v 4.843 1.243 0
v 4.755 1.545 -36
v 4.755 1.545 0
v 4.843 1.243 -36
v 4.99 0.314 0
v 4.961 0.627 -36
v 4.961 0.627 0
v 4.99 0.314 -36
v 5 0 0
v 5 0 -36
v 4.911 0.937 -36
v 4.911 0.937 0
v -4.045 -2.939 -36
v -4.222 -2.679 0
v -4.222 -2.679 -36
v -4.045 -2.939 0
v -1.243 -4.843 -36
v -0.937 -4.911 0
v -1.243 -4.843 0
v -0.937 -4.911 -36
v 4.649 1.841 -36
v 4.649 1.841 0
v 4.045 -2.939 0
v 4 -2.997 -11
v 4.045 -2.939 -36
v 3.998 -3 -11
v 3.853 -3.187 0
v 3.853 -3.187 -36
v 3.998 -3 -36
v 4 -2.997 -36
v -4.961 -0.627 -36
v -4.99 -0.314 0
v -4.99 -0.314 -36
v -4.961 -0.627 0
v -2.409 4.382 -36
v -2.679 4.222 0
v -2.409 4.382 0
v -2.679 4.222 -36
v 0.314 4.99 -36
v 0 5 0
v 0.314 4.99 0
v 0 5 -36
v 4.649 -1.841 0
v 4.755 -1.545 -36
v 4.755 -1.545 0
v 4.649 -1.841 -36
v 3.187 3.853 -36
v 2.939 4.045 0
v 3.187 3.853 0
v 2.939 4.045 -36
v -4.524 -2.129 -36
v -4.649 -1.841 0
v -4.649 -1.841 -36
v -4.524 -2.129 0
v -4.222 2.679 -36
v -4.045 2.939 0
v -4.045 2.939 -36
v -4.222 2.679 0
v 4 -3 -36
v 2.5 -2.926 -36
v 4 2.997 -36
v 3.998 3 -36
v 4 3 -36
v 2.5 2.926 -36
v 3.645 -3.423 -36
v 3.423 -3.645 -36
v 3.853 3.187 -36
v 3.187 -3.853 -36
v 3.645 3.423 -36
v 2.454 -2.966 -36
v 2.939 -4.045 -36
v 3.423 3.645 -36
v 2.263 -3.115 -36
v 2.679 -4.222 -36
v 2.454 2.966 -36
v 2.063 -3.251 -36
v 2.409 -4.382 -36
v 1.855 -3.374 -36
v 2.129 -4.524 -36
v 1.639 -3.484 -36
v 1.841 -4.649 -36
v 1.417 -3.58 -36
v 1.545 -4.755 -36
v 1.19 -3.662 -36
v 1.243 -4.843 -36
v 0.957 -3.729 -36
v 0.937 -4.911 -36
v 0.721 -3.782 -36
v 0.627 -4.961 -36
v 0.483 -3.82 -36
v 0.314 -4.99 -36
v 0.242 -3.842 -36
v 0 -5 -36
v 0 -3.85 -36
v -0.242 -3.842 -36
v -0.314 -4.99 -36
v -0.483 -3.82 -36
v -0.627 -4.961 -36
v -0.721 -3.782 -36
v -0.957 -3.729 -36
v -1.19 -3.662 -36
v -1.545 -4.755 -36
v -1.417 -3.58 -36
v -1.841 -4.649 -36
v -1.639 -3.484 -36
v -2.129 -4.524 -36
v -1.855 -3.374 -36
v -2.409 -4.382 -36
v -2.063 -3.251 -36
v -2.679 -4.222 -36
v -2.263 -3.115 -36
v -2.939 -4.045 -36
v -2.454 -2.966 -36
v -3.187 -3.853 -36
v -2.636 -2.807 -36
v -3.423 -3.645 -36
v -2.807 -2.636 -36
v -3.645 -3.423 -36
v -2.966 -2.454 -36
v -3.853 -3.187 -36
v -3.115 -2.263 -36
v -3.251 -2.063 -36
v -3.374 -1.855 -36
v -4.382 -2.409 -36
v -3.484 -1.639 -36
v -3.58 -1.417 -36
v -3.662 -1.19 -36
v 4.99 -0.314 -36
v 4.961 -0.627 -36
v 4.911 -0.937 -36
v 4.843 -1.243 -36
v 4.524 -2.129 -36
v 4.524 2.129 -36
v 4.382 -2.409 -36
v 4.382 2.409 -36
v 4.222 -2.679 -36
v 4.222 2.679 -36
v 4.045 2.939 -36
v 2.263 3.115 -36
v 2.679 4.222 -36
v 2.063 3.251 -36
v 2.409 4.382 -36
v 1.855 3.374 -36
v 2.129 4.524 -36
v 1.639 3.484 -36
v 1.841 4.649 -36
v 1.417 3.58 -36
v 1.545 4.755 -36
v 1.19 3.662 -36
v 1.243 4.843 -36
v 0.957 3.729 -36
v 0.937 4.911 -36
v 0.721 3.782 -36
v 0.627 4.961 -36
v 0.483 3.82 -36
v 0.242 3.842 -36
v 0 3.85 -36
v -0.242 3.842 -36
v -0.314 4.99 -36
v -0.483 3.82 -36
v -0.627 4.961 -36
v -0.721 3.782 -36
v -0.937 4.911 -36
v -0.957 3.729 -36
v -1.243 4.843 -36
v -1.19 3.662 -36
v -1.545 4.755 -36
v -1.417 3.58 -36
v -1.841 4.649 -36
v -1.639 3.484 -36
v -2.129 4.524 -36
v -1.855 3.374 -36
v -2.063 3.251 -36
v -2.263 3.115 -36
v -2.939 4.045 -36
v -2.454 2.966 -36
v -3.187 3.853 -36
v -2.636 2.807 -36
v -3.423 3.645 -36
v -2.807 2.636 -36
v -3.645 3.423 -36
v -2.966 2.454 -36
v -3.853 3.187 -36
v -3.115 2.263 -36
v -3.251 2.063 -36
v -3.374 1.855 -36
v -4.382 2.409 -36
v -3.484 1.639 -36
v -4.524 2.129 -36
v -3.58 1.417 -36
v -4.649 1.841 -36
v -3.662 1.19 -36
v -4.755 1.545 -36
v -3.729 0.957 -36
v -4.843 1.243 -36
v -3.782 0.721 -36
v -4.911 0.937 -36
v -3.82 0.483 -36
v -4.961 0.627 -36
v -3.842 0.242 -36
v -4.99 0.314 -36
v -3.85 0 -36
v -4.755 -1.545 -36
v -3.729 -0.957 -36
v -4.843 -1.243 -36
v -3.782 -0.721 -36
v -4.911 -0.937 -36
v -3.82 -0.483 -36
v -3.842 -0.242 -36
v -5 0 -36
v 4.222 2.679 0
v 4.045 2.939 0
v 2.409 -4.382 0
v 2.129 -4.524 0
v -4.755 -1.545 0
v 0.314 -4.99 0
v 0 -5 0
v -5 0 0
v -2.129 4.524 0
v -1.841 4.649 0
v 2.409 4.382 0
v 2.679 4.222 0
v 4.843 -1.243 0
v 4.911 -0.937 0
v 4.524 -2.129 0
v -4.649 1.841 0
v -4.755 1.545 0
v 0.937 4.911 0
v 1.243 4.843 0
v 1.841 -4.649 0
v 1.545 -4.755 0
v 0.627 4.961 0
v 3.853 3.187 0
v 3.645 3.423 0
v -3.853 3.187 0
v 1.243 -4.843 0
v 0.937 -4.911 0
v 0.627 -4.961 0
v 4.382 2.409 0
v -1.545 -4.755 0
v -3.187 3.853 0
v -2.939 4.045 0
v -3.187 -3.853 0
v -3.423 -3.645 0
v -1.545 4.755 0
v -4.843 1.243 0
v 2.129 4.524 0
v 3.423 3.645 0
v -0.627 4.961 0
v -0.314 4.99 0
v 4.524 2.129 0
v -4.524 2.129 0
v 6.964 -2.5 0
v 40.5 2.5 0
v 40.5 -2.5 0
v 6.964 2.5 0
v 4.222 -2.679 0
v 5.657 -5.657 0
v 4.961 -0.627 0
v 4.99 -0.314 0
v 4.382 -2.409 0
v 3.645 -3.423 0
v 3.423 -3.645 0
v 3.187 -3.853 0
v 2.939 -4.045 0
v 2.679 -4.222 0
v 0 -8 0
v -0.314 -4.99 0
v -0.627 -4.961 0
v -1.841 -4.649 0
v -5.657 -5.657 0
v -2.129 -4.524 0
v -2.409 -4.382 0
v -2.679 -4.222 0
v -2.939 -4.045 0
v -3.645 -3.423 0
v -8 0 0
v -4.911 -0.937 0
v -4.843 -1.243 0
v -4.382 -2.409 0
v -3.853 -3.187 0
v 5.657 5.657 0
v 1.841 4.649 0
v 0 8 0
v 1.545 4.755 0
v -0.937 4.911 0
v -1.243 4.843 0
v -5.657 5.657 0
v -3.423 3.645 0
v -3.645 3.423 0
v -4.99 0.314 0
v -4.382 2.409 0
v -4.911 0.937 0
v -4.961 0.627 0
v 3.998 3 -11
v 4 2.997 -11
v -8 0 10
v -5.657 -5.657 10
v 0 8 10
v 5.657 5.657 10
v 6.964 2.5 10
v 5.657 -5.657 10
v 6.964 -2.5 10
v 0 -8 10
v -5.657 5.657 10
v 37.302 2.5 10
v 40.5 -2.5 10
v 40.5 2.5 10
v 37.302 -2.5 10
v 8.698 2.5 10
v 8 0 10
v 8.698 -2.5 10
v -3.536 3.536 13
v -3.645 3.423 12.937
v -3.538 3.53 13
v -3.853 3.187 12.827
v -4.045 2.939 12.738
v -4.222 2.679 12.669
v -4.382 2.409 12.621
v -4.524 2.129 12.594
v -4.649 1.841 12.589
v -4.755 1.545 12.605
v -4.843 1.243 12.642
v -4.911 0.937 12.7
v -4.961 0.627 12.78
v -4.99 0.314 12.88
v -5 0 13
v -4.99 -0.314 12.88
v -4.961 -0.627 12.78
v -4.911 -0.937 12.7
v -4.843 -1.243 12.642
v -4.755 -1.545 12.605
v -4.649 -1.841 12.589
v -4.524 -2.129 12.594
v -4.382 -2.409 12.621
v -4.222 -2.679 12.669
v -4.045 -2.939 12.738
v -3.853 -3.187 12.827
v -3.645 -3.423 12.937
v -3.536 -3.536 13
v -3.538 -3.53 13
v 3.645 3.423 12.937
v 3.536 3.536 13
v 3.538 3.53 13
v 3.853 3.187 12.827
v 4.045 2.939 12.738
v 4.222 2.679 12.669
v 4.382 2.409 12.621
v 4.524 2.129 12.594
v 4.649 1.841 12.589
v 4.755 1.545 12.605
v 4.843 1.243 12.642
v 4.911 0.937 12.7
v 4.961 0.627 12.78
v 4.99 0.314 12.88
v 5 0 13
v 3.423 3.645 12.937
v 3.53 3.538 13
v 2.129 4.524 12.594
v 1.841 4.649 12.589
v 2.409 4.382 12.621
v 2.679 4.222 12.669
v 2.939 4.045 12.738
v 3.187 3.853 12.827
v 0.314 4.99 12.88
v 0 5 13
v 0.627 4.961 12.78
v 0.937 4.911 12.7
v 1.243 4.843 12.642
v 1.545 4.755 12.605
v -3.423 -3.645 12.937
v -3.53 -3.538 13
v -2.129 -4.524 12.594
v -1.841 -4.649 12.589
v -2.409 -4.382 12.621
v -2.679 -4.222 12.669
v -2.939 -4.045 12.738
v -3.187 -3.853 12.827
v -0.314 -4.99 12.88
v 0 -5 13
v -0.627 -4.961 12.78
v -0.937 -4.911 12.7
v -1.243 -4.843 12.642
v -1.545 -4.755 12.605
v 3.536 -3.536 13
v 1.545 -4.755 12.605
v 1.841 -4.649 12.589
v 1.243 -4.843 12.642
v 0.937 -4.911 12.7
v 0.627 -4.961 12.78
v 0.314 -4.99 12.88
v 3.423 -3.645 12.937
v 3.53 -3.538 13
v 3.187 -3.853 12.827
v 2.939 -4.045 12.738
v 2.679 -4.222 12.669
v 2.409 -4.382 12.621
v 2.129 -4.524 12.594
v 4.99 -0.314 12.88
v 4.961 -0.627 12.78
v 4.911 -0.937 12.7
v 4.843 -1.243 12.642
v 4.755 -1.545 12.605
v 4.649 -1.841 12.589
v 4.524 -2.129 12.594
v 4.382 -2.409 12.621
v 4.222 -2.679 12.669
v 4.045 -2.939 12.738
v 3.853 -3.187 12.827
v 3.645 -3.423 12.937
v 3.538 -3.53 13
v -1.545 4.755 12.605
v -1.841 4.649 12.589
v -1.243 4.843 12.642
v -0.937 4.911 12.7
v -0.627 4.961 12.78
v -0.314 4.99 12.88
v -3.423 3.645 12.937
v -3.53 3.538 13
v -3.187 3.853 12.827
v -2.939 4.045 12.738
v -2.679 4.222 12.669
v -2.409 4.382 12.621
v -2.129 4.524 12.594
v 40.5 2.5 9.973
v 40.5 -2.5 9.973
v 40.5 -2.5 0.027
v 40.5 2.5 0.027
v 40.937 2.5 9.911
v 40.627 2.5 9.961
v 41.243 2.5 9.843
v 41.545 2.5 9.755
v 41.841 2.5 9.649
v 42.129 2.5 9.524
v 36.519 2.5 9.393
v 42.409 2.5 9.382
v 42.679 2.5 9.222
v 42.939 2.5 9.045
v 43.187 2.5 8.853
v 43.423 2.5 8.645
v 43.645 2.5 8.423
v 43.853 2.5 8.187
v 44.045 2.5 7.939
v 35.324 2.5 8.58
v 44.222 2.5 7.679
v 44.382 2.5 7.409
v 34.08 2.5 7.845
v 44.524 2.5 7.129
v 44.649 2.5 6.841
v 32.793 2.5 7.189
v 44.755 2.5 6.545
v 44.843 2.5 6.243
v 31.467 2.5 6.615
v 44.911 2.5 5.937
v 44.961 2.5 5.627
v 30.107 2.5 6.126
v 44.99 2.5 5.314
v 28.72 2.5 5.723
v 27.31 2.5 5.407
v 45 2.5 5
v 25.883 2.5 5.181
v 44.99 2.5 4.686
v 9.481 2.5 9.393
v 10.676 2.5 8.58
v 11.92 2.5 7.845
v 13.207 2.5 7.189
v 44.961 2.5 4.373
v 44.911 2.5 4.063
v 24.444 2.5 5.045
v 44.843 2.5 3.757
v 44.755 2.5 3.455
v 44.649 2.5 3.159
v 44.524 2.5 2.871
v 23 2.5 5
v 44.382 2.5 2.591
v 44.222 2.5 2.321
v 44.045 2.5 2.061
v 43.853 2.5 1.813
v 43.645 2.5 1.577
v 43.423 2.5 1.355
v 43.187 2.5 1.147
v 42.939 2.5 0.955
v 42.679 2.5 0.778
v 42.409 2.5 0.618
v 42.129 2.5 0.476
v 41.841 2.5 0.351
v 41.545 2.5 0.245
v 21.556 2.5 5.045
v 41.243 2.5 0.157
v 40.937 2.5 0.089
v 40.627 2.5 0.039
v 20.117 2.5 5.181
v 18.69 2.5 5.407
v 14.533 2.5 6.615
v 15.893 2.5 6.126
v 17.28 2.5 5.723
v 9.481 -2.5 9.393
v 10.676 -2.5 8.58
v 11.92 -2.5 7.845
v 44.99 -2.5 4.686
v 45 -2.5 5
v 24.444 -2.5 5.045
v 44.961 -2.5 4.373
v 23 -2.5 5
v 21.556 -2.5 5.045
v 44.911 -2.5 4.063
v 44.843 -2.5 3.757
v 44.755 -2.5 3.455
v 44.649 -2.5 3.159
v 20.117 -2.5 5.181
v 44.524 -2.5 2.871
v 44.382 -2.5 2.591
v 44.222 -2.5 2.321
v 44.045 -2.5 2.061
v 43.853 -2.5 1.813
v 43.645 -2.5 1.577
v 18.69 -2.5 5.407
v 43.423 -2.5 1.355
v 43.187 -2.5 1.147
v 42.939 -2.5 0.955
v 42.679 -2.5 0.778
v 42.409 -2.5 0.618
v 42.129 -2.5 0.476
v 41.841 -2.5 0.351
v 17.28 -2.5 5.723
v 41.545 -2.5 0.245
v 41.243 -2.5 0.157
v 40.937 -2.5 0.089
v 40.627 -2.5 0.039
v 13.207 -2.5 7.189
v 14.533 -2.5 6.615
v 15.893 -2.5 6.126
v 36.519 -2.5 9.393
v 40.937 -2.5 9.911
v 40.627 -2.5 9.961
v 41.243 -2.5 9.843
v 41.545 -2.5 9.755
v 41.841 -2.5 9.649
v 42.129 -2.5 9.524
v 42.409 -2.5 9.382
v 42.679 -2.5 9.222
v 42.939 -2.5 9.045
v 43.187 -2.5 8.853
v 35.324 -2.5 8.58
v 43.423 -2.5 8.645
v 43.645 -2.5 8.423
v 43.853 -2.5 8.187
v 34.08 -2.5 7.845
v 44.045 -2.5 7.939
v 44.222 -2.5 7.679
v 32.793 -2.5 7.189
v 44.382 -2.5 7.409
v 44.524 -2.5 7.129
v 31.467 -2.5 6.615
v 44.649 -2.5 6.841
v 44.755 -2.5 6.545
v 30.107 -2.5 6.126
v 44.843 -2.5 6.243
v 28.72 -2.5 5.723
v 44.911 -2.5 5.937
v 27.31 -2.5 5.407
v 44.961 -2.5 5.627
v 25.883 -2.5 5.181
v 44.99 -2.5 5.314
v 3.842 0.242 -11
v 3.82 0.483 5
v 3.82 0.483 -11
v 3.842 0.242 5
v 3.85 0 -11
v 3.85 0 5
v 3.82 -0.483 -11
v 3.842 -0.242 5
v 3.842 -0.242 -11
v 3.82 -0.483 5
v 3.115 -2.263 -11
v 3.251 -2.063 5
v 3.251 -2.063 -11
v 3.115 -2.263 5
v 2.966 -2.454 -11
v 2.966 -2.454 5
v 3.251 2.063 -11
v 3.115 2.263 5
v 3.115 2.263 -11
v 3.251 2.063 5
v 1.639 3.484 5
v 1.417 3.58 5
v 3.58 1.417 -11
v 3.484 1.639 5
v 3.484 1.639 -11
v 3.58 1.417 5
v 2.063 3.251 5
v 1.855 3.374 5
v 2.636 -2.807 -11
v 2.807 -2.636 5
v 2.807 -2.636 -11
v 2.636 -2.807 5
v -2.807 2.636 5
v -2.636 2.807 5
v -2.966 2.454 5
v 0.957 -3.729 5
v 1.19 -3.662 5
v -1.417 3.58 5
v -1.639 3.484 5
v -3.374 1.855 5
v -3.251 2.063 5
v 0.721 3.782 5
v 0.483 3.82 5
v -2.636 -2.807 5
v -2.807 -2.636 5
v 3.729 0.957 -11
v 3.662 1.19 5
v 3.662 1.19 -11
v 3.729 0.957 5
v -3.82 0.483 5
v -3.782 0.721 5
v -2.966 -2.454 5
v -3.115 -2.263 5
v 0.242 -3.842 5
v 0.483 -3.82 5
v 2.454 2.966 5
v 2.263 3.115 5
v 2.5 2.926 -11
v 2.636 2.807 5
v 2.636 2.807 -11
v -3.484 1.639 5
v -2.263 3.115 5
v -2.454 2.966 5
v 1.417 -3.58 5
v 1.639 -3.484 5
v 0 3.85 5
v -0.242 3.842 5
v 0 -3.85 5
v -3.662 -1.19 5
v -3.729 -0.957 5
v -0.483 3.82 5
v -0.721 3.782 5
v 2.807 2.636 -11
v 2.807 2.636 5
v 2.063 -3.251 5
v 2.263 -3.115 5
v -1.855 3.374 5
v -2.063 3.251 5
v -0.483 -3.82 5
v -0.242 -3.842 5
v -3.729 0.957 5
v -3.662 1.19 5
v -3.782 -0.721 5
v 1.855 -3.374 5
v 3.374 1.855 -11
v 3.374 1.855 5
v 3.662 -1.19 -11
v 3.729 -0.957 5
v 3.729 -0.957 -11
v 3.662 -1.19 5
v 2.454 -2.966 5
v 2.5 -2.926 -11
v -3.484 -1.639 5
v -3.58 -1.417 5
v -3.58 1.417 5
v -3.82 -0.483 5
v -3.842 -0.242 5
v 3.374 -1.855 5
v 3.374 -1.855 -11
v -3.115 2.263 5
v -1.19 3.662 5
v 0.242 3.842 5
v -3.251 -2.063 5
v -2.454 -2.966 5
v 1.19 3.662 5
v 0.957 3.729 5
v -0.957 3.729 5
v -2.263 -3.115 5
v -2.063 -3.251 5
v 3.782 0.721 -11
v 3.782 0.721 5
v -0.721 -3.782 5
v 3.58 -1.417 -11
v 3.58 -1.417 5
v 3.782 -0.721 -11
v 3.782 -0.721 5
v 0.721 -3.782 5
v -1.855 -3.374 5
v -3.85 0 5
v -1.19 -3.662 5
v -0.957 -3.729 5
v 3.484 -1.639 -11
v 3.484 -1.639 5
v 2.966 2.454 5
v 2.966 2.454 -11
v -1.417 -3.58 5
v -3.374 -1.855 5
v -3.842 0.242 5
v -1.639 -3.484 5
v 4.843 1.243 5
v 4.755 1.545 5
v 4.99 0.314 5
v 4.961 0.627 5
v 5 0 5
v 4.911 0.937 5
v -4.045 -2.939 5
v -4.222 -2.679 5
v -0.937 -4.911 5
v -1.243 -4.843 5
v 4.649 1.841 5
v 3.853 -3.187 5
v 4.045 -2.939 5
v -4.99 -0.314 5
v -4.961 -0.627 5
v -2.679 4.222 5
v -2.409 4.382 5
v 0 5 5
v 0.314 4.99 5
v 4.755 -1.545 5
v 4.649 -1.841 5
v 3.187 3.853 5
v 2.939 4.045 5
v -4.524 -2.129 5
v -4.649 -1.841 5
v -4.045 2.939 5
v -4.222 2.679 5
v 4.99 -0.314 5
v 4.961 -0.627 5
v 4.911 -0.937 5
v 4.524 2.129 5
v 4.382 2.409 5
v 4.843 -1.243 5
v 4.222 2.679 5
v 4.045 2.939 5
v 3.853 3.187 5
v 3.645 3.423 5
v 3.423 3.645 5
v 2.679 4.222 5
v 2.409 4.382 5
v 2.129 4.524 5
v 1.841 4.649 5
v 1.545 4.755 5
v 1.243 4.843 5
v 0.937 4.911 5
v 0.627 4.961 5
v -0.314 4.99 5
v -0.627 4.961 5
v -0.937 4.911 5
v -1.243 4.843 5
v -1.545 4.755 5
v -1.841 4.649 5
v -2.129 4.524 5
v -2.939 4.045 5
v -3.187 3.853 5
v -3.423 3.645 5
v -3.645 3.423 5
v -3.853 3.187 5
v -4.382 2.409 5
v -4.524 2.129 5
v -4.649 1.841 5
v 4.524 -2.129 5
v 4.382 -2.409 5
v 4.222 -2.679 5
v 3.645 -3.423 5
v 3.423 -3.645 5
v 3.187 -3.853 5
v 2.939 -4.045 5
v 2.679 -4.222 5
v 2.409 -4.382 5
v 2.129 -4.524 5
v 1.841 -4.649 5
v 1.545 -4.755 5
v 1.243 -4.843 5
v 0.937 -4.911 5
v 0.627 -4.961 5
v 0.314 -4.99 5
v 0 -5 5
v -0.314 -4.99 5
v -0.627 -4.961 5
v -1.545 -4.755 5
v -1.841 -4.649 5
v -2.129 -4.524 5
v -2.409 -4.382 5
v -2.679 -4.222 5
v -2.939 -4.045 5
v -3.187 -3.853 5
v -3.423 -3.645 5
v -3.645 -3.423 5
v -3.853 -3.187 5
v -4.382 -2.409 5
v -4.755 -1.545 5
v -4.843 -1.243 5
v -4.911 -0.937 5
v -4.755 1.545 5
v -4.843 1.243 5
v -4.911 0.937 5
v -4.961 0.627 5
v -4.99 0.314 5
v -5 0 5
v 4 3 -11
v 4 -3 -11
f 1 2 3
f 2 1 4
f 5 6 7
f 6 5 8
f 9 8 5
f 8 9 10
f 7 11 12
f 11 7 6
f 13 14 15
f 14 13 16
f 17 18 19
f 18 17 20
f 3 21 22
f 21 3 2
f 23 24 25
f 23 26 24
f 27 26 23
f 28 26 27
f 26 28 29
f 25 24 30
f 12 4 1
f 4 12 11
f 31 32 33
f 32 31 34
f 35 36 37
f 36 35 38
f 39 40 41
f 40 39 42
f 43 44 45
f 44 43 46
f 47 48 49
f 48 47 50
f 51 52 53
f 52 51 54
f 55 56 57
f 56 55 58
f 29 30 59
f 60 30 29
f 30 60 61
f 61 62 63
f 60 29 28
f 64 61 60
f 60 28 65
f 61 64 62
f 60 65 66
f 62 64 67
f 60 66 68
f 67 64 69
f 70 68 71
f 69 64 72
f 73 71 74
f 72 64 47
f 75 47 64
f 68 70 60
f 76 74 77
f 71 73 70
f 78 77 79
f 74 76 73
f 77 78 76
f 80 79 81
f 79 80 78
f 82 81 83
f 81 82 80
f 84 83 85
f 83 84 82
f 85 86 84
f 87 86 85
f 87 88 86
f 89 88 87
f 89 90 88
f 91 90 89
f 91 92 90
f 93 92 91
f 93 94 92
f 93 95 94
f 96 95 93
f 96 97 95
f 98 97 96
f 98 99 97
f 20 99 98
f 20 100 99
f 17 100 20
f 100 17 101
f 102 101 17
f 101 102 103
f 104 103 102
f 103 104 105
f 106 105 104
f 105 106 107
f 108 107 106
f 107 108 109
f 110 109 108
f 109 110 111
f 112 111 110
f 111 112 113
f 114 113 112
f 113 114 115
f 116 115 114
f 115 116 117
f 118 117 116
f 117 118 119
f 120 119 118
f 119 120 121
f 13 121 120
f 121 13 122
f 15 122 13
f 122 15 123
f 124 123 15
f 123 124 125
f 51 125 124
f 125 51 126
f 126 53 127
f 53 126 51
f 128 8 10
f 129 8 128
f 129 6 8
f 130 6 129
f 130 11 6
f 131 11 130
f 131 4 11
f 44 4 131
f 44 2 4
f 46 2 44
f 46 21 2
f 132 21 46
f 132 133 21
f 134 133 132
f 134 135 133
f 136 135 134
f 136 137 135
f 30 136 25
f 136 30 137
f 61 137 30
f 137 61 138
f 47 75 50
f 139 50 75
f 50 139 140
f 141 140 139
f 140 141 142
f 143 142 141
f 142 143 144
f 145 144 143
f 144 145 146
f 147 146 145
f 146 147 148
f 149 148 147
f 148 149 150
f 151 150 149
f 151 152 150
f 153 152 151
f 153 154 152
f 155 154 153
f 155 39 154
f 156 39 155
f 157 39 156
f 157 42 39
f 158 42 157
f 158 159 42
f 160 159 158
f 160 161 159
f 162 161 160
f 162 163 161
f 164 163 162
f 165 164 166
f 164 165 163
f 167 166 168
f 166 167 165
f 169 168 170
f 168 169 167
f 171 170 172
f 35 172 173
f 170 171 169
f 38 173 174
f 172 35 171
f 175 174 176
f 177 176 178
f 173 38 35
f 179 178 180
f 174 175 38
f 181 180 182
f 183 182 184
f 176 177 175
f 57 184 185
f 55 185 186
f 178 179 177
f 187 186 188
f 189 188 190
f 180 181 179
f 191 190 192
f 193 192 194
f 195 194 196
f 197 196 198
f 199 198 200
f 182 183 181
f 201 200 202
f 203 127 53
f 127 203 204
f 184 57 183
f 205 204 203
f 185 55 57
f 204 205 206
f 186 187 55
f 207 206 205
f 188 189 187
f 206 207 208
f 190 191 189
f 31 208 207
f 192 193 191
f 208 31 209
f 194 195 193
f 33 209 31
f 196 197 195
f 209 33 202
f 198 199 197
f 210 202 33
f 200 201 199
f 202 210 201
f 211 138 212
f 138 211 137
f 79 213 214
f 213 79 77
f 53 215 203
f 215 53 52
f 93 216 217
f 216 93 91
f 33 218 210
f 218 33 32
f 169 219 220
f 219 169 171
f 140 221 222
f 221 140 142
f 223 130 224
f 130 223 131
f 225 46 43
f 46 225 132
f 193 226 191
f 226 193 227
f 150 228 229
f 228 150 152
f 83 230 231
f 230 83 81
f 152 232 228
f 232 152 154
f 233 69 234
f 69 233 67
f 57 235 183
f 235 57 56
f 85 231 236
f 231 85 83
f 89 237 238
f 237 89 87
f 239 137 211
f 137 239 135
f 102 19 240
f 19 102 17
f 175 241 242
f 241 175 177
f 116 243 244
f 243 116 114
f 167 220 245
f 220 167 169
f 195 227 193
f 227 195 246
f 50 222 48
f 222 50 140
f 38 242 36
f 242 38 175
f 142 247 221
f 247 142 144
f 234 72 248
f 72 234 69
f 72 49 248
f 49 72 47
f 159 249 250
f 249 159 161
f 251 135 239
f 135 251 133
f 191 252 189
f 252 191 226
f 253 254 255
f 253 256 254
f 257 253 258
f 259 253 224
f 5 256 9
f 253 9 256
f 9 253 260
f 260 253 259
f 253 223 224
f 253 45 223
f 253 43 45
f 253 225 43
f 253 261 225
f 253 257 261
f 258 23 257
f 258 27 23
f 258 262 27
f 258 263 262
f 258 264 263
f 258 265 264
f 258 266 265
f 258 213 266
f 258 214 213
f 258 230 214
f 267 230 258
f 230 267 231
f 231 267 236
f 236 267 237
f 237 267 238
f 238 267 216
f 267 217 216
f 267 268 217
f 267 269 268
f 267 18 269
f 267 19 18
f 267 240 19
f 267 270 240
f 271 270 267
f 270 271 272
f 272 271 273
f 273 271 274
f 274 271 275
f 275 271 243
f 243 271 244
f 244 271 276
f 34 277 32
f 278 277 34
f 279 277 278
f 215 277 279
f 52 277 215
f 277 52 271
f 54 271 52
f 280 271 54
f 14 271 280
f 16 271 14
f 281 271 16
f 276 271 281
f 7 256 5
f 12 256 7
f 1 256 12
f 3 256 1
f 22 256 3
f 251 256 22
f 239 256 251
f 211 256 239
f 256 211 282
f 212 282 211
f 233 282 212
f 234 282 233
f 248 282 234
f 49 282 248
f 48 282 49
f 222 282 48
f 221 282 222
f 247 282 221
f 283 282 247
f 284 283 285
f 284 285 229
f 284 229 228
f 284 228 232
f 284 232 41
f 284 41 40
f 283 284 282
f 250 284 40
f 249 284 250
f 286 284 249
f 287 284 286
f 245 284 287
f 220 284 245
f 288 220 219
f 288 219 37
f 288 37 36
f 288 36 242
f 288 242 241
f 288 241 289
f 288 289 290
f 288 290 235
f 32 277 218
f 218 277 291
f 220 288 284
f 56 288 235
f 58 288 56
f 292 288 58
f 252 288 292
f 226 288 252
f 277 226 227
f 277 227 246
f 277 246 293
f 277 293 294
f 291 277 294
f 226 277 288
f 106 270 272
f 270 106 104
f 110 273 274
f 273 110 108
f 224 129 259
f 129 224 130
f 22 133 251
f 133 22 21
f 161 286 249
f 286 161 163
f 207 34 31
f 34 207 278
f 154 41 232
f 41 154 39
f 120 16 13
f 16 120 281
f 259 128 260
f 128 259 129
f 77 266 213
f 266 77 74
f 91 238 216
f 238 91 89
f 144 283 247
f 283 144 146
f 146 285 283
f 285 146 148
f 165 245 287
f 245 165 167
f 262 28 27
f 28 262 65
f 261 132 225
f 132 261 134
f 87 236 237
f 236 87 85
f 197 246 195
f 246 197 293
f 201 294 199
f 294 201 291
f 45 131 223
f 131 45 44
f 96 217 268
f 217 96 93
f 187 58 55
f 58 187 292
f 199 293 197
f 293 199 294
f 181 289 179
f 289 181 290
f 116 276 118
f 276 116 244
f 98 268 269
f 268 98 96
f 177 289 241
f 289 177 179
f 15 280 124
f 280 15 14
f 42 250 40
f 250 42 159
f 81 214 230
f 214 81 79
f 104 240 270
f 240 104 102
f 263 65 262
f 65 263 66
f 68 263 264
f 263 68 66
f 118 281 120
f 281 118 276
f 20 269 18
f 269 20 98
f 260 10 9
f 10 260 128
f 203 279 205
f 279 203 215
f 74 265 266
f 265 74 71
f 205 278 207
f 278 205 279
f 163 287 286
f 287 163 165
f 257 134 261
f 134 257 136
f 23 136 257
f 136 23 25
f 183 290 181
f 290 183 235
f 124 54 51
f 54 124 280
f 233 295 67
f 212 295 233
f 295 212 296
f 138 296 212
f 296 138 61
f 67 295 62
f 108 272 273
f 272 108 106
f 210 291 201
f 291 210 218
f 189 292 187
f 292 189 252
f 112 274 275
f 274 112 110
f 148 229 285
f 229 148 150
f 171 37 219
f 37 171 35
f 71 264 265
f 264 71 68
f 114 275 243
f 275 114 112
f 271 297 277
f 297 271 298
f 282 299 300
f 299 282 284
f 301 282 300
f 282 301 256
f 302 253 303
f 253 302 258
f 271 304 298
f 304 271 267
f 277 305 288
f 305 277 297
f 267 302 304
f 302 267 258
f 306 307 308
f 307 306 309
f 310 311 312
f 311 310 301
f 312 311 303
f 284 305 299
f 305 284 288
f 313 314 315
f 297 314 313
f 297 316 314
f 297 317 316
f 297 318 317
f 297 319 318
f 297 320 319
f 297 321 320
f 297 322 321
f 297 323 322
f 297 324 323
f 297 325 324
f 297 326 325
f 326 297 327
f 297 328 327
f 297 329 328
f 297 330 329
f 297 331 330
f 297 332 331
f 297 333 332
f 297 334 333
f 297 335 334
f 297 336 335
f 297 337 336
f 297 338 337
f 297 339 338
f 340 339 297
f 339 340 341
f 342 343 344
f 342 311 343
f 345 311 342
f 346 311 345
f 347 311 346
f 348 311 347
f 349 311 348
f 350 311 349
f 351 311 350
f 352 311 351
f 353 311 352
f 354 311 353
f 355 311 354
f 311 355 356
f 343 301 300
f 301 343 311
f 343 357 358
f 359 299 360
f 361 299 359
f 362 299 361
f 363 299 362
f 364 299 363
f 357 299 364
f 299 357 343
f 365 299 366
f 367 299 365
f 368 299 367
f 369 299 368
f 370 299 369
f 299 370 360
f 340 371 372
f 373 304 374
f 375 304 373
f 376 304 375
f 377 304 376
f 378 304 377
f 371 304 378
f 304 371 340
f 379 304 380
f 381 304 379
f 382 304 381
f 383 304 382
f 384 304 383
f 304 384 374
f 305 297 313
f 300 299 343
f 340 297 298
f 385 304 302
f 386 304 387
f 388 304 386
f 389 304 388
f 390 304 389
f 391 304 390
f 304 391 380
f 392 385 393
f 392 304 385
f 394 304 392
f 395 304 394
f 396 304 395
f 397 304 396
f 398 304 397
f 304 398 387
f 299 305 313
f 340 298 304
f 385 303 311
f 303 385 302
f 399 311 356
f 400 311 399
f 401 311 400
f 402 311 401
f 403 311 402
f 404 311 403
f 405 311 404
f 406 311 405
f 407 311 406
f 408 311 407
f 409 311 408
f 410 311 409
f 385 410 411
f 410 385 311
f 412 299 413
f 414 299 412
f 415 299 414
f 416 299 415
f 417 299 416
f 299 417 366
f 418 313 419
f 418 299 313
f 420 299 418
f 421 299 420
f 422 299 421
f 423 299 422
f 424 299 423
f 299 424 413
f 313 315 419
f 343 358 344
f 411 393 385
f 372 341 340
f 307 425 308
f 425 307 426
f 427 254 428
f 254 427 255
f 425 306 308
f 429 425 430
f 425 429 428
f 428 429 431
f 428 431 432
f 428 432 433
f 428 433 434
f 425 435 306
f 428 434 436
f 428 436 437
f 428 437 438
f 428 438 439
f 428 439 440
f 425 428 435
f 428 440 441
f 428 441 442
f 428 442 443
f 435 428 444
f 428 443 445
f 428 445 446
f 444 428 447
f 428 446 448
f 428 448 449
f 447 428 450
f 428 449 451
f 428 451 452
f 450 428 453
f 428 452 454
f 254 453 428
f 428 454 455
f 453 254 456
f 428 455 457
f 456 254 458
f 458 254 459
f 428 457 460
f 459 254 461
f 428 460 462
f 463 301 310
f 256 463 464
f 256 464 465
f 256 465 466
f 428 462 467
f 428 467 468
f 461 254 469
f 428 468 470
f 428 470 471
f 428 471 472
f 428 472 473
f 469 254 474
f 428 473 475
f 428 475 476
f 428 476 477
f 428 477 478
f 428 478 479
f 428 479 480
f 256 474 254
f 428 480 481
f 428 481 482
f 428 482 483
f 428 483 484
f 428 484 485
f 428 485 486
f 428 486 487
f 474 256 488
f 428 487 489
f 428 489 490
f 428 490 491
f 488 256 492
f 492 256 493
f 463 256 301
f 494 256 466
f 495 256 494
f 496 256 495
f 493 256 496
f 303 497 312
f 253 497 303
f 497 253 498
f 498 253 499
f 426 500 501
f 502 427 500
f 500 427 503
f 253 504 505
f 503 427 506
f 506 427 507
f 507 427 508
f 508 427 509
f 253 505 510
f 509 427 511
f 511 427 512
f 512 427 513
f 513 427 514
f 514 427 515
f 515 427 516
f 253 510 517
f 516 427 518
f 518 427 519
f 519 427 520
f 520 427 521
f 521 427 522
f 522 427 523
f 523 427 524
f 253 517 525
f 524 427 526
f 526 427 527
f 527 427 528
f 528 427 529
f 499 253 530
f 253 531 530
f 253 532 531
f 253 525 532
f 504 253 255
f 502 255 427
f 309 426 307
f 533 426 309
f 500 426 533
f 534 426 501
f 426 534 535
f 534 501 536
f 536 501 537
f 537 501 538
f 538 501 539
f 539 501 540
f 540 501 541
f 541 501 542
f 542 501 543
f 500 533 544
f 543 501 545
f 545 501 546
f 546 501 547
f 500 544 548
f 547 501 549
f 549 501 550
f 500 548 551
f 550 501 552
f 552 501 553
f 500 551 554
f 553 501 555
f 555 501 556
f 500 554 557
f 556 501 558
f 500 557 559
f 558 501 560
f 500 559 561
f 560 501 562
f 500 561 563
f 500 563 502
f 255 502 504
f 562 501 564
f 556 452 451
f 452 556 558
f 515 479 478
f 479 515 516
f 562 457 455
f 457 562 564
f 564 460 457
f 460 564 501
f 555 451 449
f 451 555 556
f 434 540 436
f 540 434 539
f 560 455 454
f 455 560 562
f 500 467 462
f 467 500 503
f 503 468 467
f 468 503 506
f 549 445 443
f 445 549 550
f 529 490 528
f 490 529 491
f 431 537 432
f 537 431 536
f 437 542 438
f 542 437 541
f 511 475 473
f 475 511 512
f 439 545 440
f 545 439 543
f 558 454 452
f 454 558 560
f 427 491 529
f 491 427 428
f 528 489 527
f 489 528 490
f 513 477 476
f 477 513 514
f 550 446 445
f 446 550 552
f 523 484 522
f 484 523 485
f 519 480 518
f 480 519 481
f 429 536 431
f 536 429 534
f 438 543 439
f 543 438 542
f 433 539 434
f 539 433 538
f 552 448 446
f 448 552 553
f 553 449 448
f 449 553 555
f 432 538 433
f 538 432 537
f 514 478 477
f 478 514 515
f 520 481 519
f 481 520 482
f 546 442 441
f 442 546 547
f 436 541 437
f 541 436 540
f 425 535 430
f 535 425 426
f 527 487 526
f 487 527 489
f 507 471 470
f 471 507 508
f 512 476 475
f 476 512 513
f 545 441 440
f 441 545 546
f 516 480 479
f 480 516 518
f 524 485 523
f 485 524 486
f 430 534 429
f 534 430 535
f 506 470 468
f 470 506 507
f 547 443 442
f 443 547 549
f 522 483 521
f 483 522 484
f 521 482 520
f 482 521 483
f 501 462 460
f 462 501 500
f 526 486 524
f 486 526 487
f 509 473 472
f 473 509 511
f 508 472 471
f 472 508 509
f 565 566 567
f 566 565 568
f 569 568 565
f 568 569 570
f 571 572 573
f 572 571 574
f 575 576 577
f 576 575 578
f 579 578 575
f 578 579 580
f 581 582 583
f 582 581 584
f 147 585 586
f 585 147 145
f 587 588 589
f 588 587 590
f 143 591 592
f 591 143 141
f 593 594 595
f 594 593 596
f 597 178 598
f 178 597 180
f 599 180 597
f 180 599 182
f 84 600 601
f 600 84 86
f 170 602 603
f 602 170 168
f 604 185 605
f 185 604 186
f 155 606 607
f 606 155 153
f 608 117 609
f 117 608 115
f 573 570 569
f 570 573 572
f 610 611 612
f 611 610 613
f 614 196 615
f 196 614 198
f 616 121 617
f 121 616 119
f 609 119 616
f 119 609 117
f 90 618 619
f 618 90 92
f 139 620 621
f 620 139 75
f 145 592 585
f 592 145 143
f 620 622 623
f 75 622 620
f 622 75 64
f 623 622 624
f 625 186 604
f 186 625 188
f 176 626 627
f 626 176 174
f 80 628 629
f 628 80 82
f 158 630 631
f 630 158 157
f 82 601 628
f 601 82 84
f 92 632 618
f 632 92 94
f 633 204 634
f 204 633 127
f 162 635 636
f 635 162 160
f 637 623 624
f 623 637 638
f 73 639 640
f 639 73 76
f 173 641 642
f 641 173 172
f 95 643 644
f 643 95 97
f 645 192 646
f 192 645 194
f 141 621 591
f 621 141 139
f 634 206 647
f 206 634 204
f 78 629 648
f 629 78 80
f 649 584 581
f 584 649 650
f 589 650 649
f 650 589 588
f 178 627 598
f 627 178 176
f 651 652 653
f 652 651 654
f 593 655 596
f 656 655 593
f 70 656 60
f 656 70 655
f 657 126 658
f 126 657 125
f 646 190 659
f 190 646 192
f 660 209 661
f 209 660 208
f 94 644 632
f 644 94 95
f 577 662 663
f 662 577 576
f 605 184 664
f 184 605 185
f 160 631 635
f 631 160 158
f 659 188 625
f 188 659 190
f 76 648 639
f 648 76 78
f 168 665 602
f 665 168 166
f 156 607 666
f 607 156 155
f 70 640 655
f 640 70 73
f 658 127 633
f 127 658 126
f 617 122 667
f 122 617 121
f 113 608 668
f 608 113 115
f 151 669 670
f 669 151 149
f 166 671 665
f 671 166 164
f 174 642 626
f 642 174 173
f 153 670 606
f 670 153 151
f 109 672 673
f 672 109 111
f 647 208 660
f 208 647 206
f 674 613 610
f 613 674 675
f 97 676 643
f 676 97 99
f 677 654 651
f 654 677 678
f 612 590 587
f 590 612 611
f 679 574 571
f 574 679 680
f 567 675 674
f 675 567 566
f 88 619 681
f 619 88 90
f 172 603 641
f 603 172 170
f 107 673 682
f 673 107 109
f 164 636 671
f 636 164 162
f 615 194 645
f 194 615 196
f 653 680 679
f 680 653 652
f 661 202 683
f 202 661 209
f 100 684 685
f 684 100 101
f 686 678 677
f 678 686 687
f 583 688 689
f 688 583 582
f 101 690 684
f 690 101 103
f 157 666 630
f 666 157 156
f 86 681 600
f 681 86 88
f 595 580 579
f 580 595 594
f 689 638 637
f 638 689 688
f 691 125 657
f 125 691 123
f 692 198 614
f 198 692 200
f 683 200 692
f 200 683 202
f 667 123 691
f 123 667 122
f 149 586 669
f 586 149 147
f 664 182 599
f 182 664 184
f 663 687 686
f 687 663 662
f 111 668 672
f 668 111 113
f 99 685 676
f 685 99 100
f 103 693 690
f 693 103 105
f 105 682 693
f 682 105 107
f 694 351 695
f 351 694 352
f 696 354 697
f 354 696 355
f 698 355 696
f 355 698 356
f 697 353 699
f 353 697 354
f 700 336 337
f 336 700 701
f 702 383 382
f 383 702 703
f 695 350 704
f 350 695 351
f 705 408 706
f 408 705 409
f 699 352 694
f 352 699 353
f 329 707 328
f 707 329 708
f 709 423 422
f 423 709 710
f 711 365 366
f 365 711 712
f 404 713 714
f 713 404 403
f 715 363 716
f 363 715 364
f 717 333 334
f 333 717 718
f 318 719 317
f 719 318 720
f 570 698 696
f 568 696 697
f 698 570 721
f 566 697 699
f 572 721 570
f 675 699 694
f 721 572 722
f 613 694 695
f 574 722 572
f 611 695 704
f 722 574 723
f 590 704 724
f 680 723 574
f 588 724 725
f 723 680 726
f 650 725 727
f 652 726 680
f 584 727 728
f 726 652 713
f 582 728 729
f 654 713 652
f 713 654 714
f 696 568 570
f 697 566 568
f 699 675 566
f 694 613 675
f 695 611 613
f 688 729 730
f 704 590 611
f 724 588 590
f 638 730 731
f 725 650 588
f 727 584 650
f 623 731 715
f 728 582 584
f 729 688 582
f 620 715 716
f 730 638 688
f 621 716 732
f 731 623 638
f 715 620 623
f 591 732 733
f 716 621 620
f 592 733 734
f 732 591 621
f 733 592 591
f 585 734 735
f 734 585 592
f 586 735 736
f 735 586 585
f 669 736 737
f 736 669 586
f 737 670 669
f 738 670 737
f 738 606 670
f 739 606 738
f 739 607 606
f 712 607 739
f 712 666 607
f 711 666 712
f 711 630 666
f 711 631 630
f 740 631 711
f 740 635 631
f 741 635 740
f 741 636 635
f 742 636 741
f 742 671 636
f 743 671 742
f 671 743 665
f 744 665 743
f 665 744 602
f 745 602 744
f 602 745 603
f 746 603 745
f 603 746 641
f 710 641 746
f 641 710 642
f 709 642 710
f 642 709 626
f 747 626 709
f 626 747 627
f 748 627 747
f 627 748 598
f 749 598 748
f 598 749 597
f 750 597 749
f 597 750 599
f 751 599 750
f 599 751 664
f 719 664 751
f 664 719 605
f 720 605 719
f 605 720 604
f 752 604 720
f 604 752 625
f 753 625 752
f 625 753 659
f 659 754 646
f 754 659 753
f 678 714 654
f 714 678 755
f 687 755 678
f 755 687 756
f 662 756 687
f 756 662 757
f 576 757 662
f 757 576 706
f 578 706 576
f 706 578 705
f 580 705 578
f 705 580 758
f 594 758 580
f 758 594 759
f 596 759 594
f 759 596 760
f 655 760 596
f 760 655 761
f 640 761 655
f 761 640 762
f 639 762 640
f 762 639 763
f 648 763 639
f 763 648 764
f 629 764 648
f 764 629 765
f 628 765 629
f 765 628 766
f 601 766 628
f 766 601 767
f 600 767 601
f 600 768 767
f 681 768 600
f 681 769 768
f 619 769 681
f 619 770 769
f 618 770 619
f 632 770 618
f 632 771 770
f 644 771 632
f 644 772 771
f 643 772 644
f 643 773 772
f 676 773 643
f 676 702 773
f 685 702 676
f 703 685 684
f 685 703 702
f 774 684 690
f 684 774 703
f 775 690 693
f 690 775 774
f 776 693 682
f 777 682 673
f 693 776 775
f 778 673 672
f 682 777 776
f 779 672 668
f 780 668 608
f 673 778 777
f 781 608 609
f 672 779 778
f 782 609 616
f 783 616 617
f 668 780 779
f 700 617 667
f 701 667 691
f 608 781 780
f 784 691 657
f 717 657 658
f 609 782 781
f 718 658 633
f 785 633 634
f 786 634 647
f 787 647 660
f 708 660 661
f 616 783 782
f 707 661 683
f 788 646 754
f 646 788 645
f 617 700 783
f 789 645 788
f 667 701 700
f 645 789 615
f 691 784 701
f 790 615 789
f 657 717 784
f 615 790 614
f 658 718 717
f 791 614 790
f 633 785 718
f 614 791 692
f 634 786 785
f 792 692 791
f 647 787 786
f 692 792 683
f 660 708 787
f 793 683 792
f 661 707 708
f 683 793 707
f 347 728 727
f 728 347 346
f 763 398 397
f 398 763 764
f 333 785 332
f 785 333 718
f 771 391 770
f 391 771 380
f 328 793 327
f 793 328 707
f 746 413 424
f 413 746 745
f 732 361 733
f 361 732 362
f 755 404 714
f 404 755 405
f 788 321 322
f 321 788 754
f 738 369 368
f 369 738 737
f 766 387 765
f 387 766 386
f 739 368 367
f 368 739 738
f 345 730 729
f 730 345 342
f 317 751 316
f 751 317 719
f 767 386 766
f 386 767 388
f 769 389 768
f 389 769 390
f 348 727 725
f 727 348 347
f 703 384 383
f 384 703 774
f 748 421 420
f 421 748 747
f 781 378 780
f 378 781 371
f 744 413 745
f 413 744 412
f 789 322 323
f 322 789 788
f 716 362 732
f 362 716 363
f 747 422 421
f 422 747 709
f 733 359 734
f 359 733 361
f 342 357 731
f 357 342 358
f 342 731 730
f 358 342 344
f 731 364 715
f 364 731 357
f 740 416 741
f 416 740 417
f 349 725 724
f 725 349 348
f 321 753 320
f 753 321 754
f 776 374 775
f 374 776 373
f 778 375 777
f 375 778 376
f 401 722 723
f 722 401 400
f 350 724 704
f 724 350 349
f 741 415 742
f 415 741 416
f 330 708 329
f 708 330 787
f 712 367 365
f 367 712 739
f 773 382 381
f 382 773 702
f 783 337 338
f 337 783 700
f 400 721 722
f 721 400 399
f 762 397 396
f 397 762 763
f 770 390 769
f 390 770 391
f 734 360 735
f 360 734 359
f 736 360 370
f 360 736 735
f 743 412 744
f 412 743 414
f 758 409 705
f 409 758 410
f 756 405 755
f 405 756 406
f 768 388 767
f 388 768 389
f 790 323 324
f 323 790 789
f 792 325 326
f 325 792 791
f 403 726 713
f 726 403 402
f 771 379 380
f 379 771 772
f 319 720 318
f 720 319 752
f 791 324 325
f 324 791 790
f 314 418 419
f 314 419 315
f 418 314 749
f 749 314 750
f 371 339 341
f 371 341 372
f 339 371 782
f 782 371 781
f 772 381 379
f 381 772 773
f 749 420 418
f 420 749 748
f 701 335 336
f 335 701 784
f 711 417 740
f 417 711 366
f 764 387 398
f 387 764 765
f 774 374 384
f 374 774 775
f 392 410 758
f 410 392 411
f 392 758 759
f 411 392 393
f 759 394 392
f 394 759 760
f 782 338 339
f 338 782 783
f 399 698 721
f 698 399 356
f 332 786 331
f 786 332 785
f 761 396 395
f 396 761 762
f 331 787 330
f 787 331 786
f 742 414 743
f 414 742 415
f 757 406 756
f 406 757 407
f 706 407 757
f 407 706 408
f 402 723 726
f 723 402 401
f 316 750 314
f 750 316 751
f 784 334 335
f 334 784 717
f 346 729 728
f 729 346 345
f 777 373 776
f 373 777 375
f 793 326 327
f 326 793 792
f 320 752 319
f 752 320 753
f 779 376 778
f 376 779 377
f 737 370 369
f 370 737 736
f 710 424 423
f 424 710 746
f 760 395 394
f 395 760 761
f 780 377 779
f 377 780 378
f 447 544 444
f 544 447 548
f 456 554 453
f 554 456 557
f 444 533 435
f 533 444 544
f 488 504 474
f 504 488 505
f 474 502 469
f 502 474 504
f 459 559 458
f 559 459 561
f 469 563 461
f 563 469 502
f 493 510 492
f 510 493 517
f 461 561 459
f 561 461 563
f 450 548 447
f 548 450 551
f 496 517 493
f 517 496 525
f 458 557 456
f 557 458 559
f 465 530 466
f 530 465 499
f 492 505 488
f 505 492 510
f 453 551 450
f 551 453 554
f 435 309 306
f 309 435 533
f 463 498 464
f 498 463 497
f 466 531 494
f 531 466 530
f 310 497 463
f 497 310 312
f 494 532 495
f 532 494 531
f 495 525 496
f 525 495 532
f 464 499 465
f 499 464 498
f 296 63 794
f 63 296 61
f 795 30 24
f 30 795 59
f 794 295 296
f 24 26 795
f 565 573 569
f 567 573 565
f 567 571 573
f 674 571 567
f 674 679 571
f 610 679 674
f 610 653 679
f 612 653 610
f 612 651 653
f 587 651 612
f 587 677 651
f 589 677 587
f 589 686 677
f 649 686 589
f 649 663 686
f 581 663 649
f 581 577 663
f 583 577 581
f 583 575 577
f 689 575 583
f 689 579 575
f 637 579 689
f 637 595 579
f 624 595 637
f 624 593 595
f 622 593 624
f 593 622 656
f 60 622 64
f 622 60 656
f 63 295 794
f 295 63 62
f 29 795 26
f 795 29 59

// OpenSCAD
 //linear_extrude(height=30 , convexity=1) 
 //polygon(points=[[0,0],[10,10],[100,0],[130,50],[30,50]]);
 
 
 $fn=100;
 //color(c=[49/255,45/255,49/255])
 
 union(){
 
 difference()
 {
 union(){
    
 translate([0,0,-15-11-10]) cylinder(h=15+11+10,r=5); //ось


cylinder(h=10,r=8, $fn=8);     //головка
translate([0,0,10]) cylinder(h=3,r1=8, r2=5, $fn=8); //шапка    
 
translate([23,0,5])cube([35,5,10],center = true);//ручка
translate([40,2.5,5]) rotate([90,0,0]) cylinder(h=5,r=5); //закругление ручки
     
     
 }
 translate([0,0,-15-11-11]) cylinder(h=15+11+10+20,r=3.85);
 translate([0,0,5]) cylinder(h=9, r=5);
 
 translate([23,5,28]) rotate([90,0,0]) cylinder(h=20,r=23);//вырез ручки
} 


translate([2.5,-3,-36]) cube([1.5,6,25])     ; //замок

}
